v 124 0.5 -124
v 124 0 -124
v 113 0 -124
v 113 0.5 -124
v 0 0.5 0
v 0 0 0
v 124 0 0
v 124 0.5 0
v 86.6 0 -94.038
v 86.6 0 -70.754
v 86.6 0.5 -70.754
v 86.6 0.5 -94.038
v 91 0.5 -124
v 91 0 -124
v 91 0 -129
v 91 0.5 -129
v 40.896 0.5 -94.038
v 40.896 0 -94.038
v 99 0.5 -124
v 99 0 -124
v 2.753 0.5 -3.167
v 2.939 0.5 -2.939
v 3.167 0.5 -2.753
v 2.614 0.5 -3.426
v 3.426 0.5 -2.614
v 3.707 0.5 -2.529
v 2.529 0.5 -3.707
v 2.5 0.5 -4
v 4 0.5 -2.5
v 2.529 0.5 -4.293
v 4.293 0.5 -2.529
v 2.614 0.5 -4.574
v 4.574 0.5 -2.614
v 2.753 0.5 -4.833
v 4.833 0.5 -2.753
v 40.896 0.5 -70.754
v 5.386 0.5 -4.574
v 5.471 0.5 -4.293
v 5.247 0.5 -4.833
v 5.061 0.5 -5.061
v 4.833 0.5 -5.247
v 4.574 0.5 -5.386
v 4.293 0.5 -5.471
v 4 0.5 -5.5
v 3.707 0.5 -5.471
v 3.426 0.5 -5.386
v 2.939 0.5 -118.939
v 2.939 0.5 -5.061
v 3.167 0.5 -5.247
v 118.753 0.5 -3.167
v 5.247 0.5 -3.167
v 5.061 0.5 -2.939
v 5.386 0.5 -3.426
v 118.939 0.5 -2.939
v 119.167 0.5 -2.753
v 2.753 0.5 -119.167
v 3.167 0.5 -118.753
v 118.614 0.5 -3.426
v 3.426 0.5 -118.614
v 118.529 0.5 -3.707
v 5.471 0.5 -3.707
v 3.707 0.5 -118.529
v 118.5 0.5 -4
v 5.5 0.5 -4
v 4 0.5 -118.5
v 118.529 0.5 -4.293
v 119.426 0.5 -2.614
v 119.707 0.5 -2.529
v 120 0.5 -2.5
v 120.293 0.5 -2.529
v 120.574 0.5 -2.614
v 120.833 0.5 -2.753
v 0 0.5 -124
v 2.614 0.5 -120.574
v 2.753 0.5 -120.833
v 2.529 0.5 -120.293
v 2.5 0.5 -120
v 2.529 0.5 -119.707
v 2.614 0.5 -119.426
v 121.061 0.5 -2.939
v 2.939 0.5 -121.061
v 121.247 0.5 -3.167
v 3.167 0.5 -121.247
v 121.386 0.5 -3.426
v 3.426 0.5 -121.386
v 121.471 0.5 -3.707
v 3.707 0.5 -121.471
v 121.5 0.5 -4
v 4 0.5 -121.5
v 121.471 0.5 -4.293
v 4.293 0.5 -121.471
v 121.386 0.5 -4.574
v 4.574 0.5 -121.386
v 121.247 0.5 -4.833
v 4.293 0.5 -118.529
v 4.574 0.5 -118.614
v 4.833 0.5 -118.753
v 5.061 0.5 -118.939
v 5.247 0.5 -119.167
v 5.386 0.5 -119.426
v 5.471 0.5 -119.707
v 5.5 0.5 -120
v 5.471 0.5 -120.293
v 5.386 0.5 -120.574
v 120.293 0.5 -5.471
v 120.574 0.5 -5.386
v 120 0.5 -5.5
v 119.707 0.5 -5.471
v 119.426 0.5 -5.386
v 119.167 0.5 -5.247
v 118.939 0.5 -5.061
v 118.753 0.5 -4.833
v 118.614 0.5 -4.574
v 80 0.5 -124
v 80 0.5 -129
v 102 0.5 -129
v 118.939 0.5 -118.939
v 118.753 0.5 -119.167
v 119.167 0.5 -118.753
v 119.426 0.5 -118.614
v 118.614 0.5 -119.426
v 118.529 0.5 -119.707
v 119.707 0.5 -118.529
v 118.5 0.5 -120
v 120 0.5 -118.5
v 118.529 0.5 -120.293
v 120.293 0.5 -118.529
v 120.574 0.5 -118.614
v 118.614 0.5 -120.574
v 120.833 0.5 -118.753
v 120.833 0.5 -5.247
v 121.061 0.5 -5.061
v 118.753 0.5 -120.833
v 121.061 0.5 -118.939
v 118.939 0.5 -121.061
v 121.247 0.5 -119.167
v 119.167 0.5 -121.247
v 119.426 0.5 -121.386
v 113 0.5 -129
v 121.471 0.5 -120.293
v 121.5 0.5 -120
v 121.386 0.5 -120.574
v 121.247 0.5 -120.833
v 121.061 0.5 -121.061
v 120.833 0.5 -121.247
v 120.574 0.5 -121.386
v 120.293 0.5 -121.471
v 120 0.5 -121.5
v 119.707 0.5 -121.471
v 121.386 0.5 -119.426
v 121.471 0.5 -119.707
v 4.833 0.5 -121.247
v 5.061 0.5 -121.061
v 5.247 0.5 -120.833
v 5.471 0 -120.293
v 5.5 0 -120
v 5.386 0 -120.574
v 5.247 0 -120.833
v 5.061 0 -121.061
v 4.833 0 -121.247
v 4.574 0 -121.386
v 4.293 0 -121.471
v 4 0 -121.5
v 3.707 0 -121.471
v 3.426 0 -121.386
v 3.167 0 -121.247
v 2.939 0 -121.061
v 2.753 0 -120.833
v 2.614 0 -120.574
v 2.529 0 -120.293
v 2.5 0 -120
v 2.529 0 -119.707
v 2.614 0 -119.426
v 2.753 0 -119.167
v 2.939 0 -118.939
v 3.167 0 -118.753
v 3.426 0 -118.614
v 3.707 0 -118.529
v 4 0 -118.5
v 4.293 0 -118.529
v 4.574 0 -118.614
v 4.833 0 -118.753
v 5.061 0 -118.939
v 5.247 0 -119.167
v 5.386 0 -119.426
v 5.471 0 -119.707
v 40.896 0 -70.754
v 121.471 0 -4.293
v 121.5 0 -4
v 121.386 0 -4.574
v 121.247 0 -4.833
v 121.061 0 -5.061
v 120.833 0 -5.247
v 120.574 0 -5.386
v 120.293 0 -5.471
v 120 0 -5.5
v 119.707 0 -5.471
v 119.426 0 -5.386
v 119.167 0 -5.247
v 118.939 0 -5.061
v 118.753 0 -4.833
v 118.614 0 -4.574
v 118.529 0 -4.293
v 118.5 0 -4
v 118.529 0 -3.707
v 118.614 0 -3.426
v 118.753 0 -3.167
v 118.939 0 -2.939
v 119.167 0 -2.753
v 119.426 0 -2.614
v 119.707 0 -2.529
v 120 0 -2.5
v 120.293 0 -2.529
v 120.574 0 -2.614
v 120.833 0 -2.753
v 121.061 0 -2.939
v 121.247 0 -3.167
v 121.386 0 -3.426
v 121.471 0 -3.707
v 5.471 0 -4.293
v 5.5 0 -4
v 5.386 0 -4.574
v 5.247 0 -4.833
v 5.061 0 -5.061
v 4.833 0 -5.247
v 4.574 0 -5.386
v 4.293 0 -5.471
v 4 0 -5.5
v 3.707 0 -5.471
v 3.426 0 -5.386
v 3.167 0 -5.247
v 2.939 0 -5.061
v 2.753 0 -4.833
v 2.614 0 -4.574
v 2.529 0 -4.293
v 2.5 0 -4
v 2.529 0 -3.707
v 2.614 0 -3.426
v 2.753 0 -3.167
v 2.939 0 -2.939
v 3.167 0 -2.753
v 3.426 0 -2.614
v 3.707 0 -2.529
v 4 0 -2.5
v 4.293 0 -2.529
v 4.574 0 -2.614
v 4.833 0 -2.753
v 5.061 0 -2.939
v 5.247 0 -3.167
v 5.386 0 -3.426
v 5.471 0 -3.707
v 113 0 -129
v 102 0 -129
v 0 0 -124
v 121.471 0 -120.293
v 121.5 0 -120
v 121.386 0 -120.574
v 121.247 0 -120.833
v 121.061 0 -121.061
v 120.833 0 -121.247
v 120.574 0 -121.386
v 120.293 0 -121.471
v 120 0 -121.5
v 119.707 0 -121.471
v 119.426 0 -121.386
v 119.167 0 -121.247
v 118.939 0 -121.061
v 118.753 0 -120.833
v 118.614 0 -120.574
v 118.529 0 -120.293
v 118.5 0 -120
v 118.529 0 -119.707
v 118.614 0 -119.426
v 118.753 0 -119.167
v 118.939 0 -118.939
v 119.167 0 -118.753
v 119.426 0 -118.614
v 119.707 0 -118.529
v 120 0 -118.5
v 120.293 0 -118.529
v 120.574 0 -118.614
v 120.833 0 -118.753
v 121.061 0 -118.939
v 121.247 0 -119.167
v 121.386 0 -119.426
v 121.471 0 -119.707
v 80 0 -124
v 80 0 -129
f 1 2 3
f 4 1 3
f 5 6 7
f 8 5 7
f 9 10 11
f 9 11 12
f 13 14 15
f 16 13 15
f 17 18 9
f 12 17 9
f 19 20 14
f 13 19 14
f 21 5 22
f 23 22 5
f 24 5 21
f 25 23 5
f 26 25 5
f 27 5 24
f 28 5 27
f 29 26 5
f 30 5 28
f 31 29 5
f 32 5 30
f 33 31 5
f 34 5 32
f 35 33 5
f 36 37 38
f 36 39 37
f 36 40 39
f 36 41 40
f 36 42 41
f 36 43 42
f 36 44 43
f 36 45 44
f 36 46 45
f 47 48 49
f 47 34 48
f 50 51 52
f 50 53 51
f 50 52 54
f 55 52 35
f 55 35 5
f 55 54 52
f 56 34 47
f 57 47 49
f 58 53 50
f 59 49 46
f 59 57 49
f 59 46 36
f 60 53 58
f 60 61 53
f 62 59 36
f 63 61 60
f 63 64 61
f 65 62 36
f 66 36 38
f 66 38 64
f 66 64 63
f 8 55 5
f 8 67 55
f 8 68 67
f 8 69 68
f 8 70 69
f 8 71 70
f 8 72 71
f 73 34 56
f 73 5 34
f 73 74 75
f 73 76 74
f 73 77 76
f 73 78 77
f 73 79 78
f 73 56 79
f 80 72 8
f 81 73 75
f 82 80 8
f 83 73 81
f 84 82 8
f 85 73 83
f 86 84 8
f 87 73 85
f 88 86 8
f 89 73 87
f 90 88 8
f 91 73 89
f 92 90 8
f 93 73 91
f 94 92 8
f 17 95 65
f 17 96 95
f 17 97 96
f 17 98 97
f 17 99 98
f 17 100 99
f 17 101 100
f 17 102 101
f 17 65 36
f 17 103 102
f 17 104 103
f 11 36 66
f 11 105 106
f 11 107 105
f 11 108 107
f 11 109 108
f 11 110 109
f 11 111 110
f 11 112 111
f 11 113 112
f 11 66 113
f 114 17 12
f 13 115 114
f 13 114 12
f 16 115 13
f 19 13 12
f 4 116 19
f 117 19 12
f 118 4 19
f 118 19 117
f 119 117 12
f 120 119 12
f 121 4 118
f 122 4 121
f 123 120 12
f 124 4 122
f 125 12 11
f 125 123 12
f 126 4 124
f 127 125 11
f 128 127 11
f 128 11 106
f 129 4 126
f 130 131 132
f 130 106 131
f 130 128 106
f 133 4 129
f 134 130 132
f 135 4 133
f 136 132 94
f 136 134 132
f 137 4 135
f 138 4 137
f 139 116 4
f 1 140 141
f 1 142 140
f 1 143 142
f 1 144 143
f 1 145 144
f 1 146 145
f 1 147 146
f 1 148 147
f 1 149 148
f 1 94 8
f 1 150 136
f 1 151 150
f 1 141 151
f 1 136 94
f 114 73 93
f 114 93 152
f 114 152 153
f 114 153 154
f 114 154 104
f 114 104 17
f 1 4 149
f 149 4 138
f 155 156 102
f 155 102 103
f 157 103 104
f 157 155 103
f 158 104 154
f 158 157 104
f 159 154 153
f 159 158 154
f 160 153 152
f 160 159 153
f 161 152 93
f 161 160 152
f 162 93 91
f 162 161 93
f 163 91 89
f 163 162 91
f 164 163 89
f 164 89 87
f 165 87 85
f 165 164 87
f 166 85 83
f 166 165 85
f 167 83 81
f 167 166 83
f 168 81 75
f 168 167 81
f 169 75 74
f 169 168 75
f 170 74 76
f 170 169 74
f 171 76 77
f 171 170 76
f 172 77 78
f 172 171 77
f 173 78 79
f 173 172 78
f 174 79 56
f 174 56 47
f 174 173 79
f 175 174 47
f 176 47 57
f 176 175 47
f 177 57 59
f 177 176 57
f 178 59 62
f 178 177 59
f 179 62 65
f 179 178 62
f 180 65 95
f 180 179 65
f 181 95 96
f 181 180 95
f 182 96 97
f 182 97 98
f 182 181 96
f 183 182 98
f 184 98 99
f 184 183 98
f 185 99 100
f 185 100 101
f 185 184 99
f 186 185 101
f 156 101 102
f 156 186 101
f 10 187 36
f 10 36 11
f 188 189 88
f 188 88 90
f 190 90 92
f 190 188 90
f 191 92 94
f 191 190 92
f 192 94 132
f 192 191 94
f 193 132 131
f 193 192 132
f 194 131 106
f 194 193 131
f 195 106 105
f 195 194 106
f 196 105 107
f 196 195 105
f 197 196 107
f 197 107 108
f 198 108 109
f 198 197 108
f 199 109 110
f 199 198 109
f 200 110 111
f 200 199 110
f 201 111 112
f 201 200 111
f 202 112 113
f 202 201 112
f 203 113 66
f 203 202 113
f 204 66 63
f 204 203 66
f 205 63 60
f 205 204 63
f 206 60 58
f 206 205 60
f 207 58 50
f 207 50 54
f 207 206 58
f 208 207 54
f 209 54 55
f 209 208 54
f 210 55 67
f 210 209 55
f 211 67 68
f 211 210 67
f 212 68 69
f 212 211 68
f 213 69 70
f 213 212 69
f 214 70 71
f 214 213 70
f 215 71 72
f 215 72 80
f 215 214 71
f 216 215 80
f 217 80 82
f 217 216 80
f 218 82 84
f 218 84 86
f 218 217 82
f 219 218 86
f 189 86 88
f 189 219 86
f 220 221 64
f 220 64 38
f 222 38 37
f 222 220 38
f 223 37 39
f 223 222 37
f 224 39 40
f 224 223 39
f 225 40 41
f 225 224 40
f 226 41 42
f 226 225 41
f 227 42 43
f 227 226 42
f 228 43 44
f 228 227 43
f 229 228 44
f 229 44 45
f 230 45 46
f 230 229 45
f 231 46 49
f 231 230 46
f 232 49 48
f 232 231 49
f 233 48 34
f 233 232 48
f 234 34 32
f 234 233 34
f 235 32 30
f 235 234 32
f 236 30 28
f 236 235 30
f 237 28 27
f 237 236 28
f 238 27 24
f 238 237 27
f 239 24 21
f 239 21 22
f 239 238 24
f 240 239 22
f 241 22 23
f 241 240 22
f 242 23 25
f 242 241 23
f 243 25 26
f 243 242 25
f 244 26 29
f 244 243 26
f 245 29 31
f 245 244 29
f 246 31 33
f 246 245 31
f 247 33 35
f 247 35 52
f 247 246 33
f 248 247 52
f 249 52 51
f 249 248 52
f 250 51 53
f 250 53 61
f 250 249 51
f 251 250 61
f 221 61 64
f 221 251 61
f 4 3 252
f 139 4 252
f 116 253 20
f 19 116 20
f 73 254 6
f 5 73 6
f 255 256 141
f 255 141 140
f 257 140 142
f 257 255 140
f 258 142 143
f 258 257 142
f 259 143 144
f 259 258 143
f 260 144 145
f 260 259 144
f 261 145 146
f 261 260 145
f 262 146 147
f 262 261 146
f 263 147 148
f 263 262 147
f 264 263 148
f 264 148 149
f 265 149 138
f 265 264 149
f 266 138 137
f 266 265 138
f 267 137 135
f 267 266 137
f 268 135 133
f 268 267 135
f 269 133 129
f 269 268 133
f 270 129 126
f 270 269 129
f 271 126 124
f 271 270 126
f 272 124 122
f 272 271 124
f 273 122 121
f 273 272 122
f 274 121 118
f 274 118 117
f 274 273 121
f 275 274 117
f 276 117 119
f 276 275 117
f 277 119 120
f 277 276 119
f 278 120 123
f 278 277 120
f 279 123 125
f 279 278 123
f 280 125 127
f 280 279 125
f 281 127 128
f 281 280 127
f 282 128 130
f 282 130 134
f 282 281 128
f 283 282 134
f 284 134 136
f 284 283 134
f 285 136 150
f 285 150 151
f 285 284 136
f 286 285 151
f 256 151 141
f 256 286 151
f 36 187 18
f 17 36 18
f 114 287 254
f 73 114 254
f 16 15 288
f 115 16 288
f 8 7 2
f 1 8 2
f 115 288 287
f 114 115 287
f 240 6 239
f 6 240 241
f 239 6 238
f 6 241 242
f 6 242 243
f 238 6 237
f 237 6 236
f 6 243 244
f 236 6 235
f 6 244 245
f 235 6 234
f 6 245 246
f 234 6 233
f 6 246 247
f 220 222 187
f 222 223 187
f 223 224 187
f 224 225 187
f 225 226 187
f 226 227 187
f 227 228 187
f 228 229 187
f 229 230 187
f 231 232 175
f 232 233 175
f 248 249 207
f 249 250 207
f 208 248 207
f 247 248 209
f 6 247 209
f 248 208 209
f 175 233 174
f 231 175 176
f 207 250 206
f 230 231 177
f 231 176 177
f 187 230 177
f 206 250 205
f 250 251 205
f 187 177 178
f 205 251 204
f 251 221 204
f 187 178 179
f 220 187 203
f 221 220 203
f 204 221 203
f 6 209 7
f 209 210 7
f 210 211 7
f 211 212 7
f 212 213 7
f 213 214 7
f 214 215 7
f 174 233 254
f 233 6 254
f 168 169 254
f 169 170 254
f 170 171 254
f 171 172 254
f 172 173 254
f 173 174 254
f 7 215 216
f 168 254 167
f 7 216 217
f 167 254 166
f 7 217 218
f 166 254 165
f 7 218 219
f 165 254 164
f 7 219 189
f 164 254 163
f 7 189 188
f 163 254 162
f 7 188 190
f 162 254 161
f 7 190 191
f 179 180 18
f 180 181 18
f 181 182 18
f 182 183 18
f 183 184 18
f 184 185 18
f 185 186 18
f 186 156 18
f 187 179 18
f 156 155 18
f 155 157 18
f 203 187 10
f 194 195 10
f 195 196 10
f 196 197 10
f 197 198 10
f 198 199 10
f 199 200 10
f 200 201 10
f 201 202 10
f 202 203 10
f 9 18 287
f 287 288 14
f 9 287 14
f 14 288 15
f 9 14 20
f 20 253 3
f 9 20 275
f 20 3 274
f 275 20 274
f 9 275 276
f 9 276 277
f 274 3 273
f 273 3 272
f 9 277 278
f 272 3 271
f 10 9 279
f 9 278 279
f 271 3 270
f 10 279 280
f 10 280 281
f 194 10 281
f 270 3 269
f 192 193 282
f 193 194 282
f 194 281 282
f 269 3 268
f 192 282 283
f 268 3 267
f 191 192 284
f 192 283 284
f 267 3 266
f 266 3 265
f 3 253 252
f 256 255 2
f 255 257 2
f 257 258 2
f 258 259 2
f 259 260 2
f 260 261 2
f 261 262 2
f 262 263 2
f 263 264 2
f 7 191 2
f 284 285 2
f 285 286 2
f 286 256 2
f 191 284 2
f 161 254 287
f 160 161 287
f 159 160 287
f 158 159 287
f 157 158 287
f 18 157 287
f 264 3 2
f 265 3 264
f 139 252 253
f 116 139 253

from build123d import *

# Parameters (mm, degrees)
SKETCH_2_W      = 45.704303388
SKETCH_2_H      = 23.283324367
SKETCH_2_R      = 1.5
EXTRUDE_1_DEPTH = 0.5


with BuildPart() as part:
    # Эскиз2 → Бобышка-Вытянуть1 (new body)
    with BuildSketch(Plane(origin=(0, 0, 0), x_dir=(1, 0, 0), z_dir=(0, 1, 0))):
        Polygon((113, 129), (102, 129), (99, 124), (91, 124), (91, 129), (80, 129), (80, 124), (0, 124), (0, 0), (124, 0), (124, 124), (113, 124), align=None)
        with Locations((63.748070218, 82.395863996)):
            Rectangle(SKETCH_2_W, SKETCH_2_H, mode=Mode.SUBTRACT)
        with Locations((120, 120)):
            Circle(SKETCH_2_R, mode=Mode.SUBTRACT)
        with Locations((4, 4)):
            Circle(SKETCH_2_R, mode=Mode.SUBTRACT)
        with Locations((120, 4)):
            Circle(SKETCH_2_R, mode=Mode.SUBTRACT)
        with Locations((4, 120)):
            Circle(SKETCH_2_R, mode=Mode.SUBTRACT)
    extrude(amount=EXTRUDE_1_DEPTH)


solid = part.part
